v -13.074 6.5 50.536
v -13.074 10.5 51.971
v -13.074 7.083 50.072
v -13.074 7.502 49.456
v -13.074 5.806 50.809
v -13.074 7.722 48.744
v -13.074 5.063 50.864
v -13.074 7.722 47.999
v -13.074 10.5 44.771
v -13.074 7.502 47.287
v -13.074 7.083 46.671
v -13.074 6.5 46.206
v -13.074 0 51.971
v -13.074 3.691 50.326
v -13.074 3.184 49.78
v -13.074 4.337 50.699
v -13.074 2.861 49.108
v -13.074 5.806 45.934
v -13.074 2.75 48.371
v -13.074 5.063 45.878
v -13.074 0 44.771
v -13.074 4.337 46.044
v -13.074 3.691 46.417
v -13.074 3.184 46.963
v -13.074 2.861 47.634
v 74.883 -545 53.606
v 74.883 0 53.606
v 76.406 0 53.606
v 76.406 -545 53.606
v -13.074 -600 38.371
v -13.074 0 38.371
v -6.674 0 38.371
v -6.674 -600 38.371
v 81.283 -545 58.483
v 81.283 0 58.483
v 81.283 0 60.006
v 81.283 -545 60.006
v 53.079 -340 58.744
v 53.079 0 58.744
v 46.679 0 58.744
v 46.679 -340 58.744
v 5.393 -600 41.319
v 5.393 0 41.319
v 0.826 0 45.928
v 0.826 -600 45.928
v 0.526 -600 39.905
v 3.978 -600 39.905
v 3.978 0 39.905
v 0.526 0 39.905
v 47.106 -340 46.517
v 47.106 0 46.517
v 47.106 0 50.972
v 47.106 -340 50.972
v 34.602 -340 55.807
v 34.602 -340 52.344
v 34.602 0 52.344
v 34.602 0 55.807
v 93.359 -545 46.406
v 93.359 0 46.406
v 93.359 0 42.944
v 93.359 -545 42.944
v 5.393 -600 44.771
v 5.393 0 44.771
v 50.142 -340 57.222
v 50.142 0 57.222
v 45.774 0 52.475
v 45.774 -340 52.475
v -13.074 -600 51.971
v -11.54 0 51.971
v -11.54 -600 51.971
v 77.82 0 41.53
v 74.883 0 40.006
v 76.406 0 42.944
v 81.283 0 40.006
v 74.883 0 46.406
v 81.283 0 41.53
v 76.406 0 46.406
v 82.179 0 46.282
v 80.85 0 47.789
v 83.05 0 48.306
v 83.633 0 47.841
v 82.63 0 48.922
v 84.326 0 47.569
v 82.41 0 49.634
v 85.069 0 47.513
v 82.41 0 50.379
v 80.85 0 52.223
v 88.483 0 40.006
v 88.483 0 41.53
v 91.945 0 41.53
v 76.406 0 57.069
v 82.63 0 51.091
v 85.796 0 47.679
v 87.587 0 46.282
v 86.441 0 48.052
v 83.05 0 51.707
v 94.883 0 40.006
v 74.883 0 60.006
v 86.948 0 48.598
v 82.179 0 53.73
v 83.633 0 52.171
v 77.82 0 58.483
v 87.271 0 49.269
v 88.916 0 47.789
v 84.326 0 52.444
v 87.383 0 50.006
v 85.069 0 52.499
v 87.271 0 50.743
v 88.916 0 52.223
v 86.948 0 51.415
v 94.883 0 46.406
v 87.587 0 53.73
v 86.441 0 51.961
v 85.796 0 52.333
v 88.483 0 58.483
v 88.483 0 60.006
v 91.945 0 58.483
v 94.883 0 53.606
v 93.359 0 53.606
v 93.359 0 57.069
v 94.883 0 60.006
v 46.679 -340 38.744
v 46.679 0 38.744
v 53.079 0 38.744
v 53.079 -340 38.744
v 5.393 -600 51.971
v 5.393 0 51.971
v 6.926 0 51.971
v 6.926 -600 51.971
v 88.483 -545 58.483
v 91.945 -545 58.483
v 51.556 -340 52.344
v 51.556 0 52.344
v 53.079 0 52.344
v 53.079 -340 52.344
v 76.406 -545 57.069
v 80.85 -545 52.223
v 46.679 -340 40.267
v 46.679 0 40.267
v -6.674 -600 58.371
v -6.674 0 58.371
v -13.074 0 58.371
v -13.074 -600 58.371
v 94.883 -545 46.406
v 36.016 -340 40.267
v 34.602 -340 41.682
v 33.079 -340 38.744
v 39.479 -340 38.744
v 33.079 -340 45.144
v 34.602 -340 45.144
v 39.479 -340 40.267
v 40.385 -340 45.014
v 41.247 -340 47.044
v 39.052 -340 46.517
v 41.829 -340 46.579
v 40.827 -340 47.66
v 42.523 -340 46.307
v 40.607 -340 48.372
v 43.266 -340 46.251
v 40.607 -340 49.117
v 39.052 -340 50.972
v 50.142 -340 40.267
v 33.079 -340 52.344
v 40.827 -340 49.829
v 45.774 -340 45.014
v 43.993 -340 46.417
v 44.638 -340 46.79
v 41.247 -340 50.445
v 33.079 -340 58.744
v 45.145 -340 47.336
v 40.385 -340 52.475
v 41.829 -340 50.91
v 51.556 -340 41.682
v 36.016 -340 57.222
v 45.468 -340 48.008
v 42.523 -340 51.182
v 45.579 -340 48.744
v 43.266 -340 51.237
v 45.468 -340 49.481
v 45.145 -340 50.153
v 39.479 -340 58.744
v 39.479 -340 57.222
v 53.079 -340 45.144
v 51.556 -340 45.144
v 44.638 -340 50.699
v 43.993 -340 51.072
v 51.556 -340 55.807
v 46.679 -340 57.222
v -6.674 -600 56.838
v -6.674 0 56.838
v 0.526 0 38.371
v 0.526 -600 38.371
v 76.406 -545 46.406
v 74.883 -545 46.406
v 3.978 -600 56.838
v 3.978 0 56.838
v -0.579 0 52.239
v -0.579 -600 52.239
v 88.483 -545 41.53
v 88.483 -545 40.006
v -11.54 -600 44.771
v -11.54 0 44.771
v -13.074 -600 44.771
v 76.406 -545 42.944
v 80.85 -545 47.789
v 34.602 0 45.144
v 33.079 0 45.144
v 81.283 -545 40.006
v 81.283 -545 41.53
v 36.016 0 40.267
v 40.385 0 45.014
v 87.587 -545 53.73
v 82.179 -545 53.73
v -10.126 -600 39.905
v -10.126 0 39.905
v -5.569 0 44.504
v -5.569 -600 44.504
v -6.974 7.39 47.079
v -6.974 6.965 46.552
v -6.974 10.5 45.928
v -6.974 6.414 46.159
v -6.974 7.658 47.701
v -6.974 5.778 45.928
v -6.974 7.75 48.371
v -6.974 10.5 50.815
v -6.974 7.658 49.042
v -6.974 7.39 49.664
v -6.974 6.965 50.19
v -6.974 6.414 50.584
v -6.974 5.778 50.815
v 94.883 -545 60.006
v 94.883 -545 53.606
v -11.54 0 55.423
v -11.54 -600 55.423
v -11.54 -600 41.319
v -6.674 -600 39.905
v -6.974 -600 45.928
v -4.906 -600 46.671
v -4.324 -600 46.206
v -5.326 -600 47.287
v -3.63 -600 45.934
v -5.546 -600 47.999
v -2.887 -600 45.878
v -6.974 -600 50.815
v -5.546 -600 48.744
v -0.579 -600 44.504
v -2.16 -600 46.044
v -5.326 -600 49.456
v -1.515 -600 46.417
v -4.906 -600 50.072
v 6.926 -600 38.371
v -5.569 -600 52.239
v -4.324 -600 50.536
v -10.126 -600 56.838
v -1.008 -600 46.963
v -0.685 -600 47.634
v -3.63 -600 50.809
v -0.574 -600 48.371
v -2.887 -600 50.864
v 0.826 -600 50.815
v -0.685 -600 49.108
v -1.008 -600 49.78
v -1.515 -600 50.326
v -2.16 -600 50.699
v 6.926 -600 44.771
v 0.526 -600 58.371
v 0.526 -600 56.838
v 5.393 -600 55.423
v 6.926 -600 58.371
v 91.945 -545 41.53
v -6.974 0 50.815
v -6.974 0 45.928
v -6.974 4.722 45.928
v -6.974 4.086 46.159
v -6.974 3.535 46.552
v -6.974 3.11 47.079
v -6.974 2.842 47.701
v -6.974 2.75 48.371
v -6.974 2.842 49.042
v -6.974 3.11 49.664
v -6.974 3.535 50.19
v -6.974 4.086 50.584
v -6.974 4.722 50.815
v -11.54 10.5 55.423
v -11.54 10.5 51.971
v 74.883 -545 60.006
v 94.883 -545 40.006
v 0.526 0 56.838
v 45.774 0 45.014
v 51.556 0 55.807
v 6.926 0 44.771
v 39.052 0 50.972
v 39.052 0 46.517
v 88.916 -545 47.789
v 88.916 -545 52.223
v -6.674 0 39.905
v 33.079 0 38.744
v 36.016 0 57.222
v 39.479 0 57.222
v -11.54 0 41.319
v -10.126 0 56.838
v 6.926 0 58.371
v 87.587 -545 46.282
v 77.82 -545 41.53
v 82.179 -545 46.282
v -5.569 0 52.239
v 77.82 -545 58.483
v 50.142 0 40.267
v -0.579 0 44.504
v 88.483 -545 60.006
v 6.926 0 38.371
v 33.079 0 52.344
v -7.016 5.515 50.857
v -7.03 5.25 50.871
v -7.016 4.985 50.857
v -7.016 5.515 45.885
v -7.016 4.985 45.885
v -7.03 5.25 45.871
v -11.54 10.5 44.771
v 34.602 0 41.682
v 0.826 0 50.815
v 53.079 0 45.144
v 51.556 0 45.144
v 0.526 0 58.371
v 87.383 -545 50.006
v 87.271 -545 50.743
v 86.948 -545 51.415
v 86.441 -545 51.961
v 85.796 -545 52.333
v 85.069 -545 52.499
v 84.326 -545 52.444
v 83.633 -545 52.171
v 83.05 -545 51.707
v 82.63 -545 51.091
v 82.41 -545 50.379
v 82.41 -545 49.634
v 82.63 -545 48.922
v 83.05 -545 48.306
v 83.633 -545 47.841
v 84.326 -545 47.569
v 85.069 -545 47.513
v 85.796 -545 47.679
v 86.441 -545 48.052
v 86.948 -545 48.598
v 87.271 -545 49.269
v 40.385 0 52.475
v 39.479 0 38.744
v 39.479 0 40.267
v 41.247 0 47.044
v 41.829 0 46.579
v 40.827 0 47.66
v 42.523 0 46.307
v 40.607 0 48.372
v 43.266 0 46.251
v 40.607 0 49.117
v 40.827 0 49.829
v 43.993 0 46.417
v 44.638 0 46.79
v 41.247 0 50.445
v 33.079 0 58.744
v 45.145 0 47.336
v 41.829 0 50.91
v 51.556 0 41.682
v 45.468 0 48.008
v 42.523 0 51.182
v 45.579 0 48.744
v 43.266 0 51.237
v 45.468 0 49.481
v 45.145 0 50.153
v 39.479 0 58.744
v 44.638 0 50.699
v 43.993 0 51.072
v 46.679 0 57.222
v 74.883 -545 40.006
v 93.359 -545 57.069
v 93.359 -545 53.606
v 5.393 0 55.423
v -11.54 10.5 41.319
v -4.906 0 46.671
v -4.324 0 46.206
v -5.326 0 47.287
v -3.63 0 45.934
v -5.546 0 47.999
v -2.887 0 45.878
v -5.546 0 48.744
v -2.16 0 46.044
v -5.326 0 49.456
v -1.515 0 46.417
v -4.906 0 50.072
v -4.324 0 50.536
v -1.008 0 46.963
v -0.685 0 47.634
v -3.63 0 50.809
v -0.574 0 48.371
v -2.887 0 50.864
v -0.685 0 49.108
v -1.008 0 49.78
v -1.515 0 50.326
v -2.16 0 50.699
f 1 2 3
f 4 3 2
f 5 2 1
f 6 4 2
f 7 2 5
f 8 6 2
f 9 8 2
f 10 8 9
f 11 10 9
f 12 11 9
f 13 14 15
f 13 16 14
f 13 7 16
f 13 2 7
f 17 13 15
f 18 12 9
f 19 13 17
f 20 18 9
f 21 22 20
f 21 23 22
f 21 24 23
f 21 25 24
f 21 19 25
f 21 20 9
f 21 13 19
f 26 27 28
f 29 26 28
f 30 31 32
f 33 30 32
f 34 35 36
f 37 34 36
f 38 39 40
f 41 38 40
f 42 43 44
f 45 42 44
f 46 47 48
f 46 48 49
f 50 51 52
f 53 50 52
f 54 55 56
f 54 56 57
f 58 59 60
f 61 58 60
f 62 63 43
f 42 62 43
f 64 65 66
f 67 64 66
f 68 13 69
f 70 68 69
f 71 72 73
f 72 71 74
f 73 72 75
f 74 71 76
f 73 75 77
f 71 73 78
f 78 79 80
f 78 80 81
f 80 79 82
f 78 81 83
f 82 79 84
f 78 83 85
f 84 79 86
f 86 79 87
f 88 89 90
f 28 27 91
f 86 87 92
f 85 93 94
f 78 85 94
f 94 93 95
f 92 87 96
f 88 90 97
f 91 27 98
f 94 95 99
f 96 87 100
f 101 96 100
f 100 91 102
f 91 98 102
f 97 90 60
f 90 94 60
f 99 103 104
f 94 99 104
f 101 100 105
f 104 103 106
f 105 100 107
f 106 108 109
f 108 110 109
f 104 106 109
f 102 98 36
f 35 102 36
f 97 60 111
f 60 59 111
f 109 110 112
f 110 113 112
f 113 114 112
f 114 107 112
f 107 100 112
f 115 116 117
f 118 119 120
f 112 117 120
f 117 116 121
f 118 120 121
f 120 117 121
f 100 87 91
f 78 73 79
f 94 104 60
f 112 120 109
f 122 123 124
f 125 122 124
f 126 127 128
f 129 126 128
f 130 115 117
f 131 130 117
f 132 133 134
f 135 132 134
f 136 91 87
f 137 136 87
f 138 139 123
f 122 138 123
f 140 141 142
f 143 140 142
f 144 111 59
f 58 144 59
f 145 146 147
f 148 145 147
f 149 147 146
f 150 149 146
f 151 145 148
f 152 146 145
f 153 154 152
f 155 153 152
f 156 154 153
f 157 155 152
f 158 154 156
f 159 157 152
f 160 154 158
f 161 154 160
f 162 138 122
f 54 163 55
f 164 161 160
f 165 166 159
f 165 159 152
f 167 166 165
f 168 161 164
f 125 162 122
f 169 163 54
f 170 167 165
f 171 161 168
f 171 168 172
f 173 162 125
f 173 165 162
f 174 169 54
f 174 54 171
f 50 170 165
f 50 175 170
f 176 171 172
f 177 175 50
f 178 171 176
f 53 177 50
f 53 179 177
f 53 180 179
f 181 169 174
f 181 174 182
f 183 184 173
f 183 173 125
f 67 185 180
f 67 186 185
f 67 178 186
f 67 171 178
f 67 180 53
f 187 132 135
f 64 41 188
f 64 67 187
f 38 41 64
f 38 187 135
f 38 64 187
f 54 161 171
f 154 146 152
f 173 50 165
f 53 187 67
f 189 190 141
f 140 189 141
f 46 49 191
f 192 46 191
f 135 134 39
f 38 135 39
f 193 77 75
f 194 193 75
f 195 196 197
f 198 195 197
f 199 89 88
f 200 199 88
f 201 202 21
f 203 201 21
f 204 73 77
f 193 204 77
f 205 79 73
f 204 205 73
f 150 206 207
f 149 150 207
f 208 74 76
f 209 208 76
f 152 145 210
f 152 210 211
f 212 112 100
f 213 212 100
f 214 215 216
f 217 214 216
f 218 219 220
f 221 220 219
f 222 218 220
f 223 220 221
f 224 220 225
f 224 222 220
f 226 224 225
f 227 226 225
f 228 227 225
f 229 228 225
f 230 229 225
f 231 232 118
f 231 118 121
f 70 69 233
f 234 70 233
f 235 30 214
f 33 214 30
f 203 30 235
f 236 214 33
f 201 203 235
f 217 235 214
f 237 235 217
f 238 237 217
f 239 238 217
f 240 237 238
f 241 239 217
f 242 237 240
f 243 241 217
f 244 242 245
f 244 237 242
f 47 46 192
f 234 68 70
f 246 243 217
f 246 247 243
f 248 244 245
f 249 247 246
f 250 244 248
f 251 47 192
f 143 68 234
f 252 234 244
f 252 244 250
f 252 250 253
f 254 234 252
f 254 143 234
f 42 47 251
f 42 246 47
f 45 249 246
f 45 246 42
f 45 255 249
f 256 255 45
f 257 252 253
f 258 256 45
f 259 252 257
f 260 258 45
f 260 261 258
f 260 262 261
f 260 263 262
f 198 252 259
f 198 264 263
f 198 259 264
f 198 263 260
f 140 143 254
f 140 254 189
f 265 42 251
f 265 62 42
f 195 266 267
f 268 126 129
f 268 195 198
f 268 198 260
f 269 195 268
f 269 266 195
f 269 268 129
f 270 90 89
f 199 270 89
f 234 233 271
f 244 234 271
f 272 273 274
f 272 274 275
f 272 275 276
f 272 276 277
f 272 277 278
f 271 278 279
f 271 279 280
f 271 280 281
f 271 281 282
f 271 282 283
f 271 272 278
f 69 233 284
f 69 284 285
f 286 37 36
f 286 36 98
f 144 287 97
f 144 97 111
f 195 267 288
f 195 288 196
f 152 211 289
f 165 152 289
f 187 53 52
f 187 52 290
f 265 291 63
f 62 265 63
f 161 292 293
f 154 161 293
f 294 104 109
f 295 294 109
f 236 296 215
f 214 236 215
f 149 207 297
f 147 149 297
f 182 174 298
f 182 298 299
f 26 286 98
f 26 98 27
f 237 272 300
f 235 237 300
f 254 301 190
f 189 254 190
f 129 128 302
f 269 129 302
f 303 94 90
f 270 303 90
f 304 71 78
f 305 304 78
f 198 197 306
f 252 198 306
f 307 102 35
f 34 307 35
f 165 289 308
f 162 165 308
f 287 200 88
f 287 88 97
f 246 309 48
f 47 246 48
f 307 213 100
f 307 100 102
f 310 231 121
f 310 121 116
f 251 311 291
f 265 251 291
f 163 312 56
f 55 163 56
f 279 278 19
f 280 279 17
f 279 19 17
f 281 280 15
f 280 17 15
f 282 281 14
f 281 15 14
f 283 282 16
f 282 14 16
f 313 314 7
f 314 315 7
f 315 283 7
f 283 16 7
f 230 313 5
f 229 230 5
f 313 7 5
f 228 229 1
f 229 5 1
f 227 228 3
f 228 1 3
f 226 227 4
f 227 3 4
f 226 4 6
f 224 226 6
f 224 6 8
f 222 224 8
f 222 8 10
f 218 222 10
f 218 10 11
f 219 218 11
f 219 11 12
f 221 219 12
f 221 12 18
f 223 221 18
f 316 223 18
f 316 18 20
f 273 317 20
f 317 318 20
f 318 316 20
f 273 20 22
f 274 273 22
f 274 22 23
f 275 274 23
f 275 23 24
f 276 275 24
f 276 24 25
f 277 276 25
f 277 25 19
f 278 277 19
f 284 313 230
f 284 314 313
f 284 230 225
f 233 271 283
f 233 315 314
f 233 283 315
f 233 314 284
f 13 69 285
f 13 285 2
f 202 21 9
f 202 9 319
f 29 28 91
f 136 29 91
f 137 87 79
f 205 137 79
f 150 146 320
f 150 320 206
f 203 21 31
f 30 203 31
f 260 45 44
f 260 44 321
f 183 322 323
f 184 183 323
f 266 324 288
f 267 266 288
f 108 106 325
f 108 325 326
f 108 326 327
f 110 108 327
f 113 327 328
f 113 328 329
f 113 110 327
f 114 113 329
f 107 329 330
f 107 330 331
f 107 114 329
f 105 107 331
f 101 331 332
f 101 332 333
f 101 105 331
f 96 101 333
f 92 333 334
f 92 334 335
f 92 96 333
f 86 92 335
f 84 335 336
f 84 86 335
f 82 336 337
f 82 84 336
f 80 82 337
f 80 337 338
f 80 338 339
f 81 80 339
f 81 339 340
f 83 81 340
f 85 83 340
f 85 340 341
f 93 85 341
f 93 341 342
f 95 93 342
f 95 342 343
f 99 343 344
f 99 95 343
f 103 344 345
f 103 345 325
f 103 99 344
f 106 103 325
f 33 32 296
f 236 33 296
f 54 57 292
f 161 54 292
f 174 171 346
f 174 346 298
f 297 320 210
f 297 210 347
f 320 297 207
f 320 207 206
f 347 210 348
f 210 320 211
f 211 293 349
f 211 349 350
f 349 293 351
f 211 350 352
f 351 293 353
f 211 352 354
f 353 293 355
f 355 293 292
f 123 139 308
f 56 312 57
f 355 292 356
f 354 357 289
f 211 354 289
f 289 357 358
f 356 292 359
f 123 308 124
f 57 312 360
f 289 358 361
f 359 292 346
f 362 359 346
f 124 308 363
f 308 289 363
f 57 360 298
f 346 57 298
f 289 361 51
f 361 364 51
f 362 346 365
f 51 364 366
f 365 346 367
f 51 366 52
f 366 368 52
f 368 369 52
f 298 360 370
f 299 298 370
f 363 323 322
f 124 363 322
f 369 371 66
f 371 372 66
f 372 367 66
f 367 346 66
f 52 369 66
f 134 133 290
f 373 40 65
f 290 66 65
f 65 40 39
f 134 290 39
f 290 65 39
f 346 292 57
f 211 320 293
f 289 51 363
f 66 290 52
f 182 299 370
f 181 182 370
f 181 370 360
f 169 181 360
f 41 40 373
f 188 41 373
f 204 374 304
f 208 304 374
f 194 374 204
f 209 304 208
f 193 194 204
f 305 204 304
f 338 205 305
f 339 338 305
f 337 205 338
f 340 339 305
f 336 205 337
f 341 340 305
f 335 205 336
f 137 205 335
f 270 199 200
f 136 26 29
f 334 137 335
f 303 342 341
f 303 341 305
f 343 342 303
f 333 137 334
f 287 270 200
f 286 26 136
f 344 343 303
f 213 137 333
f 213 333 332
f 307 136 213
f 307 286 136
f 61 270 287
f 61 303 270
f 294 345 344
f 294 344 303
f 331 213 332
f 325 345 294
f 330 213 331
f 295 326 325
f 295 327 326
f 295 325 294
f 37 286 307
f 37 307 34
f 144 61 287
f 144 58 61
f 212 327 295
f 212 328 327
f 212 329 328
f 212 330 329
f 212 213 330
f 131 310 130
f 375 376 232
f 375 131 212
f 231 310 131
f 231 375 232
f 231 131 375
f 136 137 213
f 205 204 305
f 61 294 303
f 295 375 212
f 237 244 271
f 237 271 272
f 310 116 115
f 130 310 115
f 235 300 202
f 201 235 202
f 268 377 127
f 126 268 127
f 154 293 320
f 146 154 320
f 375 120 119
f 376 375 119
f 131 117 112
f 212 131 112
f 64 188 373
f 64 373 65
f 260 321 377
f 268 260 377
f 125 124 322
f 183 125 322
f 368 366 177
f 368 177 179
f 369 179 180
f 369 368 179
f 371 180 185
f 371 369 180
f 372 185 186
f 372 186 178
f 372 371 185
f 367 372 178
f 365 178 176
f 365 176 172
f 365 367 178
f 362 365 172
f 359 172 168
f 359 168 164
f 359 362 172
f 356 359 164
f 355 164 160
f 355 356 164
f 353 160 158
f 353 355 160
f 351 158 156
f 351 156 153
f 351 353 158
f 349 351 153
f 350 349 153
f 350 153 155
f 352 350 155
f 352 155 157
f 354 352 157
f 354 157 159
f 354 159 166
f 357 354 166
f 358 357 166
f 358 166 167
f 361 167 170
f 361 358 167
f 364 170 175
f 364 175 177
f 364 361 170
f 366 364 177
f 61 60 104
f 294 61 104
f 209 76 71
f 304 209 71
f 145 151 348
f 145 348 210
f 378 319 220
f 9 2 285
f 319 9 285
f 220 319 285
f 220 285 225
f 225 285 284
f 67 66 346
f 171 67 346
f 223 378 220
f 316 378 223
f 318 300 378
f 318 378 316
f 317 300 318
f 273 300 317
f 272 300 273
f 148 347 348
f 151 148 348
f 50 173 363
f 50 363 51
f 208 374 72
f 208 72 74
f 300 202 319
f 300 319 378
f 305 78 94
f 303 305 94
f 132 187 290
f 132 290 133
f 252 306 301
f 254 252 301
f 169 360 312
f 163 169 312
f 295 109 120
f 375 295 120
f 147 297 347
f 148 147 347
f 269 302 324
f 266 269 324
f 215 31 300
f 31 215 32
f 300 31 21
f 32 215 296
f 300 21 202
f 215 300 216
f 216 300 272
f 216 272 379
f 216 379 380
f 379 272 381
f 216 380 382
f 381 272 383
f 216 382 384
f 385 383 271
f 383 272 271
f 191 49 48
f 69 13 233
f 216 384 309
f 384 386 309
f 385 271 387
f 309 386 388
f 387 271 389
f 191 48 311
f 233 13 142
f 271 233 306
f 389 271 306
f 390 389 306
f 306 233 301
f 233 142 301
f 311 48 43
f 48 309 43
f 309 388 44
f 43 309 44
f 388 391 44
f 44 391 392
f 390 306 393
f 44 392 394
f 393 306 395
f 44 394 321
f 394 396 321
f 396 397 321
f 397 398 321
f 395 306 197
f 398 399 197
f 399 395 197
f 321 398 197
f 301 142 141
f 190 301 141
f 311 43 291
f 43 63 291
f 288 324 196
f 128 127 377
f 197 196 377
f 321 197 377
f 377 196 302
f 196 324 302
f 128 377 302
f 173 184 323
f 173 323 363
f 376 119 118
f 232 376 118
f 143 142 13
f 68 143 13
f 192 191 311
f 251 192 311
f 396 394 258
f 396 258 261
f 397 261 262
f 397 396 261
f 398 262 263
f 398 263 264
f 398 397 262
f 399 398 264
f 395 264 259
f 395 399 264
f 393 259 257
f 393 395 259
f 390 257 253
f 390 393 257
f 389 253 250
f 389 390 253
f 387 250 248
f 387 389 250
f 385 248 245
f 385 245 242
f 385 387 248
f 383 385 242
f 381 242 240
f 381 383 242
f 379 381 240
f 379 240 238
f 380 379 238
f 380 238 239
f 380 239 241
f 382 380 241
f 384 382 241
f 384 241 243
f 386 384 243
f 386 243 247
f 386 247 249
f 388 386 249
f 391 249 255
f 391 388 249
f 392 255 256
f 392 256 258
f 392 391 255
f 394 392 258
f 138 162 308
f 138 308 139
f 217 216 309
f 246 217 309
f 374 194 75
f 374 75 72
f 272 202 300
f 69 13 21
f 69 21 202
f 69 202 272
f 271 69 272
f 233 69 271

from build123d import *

# Parameters (mm, degrees)
F0_R     = 2.5
F1_DEPTH = 600
F2_DEPTH = 340
F3_DEPTH = 545
F4_DEPTH = 10.5
F5_R     = 2.5
F6_DEPTH = 25


with BuildPart() as f1:
    # F0 (on Front) → F1 (new body)
    with BuildSketch(Plane.XZ):
        Polygon((-6.673659, 56.837713), (-6.673659, 58.371353), (-13.073659, 58.371353), (-13.073659, 51.971353), (-11.540019, 51.971353), (-11.540019, 55.423499), (-6.973659, 50.81497), (-6.973659, 45.927736), (-11.540019, 41.319207), (-11.540019, 44.771353), (-13.073659, 44.771353), (-13.073659, 38.371353), (-6.673659, 38.371353), (-6.673659, 39.904993), (-10.125806, 39.904993), (-5.568781, 44.504101), (-0.578538, 44.504101), (3.978487, 39.904993), (0.526341, 39.904993), (0.526341, 38.371353), (6.926341, 38.371353), (6.926341, 44.771353), (5.392701, 44.771353), (5.392701, 41.319207), (0.826341, 45.927736), (0.826341, 50.81497), (5.392701, 55.423499), (5.392701, 51.971353), (6.926341, 51.971353), (6.926341, 58.371353), (0.526341, 58.371353), (0.526341, 56.837713), (3.978487, 56.837713), (-0.578538, 52.238605), (-5.568781, 52.238605), (-10.125806, 56.837713), align=None)
        with Locations((-3.073659, 48.371353)):
            Circle(F0_R, mode=Mode.SUBTRACT)
    extrude(amount=F1_DEPTH)


with BuildPart() as f2:
    # F0 (on Front) → F2 (new body)
    with BuildSketch(Plane.XZ):
        Polygon((39.479291, 57.221651), (39.479291, 58.744471), (33.079291, 58.744471), (33.079291, 52.344471), (34.602111, 52.344471), (34.602111, 55.807438), (39.052107, 50.972263), (39.052107, 46.51668), (34.602111, 41.681505), (34.602111, 45.144471), (33.079291, 45.144471), (33.079291, 38.744471), (39.479291, 38.744471), (39.479291, 40.267292), (36.016325, 40.267292), (40.384522, 45.013589), (45.774059, 45.013589), (50.142257, 40.267292), (46.679291, 40.267292), (46.679291, 38.744471), (53.079291, 38.744471), (53.079291, 45.144471), (51.55647, 45.144471), (51.55647, 41.681505), (47.106475, 46.51668), (47.106475, 50.972263), (51.55647, 55.807438), (51.55647, 52.344471), (53.079291, 52.344471), (53.079291, 58.744471), (46.679291, 58.744471), (46.679291, 57.221651), (50.142257, 57.221651), (45.774059, 52.475354), (40.384522, 52.475354), (36.016325, 57.221651), align=None)
        with Locations((43.079291, 48.744471)):
            Circle(F0_R, mode=Mode.SUBTRACT)
    extrude(amount=F2_DEPTH)


with BuildPart() as f3:
    # F0 (on Front) → F3 (new body)
    with BuildSketch(Plane.XZ):
        Polygon((81.282554, 58.482975), (81.282554, 60.006263), (74.882554, 60.006263), (74.882554, 53.606263), (76.405842, 53.606263), (76.405842, 57.068762), (80.849527, 52.223459), (80.849527, 47.789068), (76.405842, 42.943765), (76.405842, 46.406263), (74.882554, 46.406263), (74.882554, 40.006263), (81.282554, 40.006263), (81.282554, 41.529551), (77.820056, 41.529551), (82.178607, 46.282027), (87.586501, 46.282027), (91.945053, 41.529551), (88.482554, 41.529551), (88.482554, 40.006263), (94.882554, 40.006263), (94.882554, 46.406263), (93.359266, 46.406263), (93.359266, 42.943765), (88.915582, 47.789068), (88.915582, 52.223459), (93.359266, 57.068762), (93.359266, 53.606263), (94.882554, 53.606263), (94.882554, 60.006263), (88.482554, 60.006263), (88.482554, 58.482975), (91.945053, 58.482975), (87.586501, 53.7305), (82.178607, 53.7305), (77.820056, 58.482975), align=None)
        with Locations((84.882554, 50.006263)):
            Circle(F0_R, mode=Mode.SUBTRACT)
    extrude(amount=F3_DEPTH)


with BuildPart() as f4:
    # F0 (on Front) → F4 (new body)
    with BuildSketch(Plane.XZ):
        Polygon((-11.540019, 51.971353), (-13.073659, 51.971353), (-13.073659, 44.771353), (-11.540019, 44.771353), (-11.540019, 41.319207), (-6.973659, 45.927736), (-6.973659, 50.81497), (-11.540019, 55.423499), align=None)
    extrude(amount=-F4_DEPTH)

    # F5 (on face) → F6 (cut)
    with BuildSketch(Plane(origin=(-13.073659, 0, 0), x_dir=(0, -1, 0), z_dir=(-1, 0, 0))):
        with Locations((-5.25, 48.371353)):
            Circle(F5_R)
    extrude(amount=-F6_DEPTH, mode=Mode.SUBTRACT)


solid = Compound([f1.part, f2.part, f3.part, f4.part])
